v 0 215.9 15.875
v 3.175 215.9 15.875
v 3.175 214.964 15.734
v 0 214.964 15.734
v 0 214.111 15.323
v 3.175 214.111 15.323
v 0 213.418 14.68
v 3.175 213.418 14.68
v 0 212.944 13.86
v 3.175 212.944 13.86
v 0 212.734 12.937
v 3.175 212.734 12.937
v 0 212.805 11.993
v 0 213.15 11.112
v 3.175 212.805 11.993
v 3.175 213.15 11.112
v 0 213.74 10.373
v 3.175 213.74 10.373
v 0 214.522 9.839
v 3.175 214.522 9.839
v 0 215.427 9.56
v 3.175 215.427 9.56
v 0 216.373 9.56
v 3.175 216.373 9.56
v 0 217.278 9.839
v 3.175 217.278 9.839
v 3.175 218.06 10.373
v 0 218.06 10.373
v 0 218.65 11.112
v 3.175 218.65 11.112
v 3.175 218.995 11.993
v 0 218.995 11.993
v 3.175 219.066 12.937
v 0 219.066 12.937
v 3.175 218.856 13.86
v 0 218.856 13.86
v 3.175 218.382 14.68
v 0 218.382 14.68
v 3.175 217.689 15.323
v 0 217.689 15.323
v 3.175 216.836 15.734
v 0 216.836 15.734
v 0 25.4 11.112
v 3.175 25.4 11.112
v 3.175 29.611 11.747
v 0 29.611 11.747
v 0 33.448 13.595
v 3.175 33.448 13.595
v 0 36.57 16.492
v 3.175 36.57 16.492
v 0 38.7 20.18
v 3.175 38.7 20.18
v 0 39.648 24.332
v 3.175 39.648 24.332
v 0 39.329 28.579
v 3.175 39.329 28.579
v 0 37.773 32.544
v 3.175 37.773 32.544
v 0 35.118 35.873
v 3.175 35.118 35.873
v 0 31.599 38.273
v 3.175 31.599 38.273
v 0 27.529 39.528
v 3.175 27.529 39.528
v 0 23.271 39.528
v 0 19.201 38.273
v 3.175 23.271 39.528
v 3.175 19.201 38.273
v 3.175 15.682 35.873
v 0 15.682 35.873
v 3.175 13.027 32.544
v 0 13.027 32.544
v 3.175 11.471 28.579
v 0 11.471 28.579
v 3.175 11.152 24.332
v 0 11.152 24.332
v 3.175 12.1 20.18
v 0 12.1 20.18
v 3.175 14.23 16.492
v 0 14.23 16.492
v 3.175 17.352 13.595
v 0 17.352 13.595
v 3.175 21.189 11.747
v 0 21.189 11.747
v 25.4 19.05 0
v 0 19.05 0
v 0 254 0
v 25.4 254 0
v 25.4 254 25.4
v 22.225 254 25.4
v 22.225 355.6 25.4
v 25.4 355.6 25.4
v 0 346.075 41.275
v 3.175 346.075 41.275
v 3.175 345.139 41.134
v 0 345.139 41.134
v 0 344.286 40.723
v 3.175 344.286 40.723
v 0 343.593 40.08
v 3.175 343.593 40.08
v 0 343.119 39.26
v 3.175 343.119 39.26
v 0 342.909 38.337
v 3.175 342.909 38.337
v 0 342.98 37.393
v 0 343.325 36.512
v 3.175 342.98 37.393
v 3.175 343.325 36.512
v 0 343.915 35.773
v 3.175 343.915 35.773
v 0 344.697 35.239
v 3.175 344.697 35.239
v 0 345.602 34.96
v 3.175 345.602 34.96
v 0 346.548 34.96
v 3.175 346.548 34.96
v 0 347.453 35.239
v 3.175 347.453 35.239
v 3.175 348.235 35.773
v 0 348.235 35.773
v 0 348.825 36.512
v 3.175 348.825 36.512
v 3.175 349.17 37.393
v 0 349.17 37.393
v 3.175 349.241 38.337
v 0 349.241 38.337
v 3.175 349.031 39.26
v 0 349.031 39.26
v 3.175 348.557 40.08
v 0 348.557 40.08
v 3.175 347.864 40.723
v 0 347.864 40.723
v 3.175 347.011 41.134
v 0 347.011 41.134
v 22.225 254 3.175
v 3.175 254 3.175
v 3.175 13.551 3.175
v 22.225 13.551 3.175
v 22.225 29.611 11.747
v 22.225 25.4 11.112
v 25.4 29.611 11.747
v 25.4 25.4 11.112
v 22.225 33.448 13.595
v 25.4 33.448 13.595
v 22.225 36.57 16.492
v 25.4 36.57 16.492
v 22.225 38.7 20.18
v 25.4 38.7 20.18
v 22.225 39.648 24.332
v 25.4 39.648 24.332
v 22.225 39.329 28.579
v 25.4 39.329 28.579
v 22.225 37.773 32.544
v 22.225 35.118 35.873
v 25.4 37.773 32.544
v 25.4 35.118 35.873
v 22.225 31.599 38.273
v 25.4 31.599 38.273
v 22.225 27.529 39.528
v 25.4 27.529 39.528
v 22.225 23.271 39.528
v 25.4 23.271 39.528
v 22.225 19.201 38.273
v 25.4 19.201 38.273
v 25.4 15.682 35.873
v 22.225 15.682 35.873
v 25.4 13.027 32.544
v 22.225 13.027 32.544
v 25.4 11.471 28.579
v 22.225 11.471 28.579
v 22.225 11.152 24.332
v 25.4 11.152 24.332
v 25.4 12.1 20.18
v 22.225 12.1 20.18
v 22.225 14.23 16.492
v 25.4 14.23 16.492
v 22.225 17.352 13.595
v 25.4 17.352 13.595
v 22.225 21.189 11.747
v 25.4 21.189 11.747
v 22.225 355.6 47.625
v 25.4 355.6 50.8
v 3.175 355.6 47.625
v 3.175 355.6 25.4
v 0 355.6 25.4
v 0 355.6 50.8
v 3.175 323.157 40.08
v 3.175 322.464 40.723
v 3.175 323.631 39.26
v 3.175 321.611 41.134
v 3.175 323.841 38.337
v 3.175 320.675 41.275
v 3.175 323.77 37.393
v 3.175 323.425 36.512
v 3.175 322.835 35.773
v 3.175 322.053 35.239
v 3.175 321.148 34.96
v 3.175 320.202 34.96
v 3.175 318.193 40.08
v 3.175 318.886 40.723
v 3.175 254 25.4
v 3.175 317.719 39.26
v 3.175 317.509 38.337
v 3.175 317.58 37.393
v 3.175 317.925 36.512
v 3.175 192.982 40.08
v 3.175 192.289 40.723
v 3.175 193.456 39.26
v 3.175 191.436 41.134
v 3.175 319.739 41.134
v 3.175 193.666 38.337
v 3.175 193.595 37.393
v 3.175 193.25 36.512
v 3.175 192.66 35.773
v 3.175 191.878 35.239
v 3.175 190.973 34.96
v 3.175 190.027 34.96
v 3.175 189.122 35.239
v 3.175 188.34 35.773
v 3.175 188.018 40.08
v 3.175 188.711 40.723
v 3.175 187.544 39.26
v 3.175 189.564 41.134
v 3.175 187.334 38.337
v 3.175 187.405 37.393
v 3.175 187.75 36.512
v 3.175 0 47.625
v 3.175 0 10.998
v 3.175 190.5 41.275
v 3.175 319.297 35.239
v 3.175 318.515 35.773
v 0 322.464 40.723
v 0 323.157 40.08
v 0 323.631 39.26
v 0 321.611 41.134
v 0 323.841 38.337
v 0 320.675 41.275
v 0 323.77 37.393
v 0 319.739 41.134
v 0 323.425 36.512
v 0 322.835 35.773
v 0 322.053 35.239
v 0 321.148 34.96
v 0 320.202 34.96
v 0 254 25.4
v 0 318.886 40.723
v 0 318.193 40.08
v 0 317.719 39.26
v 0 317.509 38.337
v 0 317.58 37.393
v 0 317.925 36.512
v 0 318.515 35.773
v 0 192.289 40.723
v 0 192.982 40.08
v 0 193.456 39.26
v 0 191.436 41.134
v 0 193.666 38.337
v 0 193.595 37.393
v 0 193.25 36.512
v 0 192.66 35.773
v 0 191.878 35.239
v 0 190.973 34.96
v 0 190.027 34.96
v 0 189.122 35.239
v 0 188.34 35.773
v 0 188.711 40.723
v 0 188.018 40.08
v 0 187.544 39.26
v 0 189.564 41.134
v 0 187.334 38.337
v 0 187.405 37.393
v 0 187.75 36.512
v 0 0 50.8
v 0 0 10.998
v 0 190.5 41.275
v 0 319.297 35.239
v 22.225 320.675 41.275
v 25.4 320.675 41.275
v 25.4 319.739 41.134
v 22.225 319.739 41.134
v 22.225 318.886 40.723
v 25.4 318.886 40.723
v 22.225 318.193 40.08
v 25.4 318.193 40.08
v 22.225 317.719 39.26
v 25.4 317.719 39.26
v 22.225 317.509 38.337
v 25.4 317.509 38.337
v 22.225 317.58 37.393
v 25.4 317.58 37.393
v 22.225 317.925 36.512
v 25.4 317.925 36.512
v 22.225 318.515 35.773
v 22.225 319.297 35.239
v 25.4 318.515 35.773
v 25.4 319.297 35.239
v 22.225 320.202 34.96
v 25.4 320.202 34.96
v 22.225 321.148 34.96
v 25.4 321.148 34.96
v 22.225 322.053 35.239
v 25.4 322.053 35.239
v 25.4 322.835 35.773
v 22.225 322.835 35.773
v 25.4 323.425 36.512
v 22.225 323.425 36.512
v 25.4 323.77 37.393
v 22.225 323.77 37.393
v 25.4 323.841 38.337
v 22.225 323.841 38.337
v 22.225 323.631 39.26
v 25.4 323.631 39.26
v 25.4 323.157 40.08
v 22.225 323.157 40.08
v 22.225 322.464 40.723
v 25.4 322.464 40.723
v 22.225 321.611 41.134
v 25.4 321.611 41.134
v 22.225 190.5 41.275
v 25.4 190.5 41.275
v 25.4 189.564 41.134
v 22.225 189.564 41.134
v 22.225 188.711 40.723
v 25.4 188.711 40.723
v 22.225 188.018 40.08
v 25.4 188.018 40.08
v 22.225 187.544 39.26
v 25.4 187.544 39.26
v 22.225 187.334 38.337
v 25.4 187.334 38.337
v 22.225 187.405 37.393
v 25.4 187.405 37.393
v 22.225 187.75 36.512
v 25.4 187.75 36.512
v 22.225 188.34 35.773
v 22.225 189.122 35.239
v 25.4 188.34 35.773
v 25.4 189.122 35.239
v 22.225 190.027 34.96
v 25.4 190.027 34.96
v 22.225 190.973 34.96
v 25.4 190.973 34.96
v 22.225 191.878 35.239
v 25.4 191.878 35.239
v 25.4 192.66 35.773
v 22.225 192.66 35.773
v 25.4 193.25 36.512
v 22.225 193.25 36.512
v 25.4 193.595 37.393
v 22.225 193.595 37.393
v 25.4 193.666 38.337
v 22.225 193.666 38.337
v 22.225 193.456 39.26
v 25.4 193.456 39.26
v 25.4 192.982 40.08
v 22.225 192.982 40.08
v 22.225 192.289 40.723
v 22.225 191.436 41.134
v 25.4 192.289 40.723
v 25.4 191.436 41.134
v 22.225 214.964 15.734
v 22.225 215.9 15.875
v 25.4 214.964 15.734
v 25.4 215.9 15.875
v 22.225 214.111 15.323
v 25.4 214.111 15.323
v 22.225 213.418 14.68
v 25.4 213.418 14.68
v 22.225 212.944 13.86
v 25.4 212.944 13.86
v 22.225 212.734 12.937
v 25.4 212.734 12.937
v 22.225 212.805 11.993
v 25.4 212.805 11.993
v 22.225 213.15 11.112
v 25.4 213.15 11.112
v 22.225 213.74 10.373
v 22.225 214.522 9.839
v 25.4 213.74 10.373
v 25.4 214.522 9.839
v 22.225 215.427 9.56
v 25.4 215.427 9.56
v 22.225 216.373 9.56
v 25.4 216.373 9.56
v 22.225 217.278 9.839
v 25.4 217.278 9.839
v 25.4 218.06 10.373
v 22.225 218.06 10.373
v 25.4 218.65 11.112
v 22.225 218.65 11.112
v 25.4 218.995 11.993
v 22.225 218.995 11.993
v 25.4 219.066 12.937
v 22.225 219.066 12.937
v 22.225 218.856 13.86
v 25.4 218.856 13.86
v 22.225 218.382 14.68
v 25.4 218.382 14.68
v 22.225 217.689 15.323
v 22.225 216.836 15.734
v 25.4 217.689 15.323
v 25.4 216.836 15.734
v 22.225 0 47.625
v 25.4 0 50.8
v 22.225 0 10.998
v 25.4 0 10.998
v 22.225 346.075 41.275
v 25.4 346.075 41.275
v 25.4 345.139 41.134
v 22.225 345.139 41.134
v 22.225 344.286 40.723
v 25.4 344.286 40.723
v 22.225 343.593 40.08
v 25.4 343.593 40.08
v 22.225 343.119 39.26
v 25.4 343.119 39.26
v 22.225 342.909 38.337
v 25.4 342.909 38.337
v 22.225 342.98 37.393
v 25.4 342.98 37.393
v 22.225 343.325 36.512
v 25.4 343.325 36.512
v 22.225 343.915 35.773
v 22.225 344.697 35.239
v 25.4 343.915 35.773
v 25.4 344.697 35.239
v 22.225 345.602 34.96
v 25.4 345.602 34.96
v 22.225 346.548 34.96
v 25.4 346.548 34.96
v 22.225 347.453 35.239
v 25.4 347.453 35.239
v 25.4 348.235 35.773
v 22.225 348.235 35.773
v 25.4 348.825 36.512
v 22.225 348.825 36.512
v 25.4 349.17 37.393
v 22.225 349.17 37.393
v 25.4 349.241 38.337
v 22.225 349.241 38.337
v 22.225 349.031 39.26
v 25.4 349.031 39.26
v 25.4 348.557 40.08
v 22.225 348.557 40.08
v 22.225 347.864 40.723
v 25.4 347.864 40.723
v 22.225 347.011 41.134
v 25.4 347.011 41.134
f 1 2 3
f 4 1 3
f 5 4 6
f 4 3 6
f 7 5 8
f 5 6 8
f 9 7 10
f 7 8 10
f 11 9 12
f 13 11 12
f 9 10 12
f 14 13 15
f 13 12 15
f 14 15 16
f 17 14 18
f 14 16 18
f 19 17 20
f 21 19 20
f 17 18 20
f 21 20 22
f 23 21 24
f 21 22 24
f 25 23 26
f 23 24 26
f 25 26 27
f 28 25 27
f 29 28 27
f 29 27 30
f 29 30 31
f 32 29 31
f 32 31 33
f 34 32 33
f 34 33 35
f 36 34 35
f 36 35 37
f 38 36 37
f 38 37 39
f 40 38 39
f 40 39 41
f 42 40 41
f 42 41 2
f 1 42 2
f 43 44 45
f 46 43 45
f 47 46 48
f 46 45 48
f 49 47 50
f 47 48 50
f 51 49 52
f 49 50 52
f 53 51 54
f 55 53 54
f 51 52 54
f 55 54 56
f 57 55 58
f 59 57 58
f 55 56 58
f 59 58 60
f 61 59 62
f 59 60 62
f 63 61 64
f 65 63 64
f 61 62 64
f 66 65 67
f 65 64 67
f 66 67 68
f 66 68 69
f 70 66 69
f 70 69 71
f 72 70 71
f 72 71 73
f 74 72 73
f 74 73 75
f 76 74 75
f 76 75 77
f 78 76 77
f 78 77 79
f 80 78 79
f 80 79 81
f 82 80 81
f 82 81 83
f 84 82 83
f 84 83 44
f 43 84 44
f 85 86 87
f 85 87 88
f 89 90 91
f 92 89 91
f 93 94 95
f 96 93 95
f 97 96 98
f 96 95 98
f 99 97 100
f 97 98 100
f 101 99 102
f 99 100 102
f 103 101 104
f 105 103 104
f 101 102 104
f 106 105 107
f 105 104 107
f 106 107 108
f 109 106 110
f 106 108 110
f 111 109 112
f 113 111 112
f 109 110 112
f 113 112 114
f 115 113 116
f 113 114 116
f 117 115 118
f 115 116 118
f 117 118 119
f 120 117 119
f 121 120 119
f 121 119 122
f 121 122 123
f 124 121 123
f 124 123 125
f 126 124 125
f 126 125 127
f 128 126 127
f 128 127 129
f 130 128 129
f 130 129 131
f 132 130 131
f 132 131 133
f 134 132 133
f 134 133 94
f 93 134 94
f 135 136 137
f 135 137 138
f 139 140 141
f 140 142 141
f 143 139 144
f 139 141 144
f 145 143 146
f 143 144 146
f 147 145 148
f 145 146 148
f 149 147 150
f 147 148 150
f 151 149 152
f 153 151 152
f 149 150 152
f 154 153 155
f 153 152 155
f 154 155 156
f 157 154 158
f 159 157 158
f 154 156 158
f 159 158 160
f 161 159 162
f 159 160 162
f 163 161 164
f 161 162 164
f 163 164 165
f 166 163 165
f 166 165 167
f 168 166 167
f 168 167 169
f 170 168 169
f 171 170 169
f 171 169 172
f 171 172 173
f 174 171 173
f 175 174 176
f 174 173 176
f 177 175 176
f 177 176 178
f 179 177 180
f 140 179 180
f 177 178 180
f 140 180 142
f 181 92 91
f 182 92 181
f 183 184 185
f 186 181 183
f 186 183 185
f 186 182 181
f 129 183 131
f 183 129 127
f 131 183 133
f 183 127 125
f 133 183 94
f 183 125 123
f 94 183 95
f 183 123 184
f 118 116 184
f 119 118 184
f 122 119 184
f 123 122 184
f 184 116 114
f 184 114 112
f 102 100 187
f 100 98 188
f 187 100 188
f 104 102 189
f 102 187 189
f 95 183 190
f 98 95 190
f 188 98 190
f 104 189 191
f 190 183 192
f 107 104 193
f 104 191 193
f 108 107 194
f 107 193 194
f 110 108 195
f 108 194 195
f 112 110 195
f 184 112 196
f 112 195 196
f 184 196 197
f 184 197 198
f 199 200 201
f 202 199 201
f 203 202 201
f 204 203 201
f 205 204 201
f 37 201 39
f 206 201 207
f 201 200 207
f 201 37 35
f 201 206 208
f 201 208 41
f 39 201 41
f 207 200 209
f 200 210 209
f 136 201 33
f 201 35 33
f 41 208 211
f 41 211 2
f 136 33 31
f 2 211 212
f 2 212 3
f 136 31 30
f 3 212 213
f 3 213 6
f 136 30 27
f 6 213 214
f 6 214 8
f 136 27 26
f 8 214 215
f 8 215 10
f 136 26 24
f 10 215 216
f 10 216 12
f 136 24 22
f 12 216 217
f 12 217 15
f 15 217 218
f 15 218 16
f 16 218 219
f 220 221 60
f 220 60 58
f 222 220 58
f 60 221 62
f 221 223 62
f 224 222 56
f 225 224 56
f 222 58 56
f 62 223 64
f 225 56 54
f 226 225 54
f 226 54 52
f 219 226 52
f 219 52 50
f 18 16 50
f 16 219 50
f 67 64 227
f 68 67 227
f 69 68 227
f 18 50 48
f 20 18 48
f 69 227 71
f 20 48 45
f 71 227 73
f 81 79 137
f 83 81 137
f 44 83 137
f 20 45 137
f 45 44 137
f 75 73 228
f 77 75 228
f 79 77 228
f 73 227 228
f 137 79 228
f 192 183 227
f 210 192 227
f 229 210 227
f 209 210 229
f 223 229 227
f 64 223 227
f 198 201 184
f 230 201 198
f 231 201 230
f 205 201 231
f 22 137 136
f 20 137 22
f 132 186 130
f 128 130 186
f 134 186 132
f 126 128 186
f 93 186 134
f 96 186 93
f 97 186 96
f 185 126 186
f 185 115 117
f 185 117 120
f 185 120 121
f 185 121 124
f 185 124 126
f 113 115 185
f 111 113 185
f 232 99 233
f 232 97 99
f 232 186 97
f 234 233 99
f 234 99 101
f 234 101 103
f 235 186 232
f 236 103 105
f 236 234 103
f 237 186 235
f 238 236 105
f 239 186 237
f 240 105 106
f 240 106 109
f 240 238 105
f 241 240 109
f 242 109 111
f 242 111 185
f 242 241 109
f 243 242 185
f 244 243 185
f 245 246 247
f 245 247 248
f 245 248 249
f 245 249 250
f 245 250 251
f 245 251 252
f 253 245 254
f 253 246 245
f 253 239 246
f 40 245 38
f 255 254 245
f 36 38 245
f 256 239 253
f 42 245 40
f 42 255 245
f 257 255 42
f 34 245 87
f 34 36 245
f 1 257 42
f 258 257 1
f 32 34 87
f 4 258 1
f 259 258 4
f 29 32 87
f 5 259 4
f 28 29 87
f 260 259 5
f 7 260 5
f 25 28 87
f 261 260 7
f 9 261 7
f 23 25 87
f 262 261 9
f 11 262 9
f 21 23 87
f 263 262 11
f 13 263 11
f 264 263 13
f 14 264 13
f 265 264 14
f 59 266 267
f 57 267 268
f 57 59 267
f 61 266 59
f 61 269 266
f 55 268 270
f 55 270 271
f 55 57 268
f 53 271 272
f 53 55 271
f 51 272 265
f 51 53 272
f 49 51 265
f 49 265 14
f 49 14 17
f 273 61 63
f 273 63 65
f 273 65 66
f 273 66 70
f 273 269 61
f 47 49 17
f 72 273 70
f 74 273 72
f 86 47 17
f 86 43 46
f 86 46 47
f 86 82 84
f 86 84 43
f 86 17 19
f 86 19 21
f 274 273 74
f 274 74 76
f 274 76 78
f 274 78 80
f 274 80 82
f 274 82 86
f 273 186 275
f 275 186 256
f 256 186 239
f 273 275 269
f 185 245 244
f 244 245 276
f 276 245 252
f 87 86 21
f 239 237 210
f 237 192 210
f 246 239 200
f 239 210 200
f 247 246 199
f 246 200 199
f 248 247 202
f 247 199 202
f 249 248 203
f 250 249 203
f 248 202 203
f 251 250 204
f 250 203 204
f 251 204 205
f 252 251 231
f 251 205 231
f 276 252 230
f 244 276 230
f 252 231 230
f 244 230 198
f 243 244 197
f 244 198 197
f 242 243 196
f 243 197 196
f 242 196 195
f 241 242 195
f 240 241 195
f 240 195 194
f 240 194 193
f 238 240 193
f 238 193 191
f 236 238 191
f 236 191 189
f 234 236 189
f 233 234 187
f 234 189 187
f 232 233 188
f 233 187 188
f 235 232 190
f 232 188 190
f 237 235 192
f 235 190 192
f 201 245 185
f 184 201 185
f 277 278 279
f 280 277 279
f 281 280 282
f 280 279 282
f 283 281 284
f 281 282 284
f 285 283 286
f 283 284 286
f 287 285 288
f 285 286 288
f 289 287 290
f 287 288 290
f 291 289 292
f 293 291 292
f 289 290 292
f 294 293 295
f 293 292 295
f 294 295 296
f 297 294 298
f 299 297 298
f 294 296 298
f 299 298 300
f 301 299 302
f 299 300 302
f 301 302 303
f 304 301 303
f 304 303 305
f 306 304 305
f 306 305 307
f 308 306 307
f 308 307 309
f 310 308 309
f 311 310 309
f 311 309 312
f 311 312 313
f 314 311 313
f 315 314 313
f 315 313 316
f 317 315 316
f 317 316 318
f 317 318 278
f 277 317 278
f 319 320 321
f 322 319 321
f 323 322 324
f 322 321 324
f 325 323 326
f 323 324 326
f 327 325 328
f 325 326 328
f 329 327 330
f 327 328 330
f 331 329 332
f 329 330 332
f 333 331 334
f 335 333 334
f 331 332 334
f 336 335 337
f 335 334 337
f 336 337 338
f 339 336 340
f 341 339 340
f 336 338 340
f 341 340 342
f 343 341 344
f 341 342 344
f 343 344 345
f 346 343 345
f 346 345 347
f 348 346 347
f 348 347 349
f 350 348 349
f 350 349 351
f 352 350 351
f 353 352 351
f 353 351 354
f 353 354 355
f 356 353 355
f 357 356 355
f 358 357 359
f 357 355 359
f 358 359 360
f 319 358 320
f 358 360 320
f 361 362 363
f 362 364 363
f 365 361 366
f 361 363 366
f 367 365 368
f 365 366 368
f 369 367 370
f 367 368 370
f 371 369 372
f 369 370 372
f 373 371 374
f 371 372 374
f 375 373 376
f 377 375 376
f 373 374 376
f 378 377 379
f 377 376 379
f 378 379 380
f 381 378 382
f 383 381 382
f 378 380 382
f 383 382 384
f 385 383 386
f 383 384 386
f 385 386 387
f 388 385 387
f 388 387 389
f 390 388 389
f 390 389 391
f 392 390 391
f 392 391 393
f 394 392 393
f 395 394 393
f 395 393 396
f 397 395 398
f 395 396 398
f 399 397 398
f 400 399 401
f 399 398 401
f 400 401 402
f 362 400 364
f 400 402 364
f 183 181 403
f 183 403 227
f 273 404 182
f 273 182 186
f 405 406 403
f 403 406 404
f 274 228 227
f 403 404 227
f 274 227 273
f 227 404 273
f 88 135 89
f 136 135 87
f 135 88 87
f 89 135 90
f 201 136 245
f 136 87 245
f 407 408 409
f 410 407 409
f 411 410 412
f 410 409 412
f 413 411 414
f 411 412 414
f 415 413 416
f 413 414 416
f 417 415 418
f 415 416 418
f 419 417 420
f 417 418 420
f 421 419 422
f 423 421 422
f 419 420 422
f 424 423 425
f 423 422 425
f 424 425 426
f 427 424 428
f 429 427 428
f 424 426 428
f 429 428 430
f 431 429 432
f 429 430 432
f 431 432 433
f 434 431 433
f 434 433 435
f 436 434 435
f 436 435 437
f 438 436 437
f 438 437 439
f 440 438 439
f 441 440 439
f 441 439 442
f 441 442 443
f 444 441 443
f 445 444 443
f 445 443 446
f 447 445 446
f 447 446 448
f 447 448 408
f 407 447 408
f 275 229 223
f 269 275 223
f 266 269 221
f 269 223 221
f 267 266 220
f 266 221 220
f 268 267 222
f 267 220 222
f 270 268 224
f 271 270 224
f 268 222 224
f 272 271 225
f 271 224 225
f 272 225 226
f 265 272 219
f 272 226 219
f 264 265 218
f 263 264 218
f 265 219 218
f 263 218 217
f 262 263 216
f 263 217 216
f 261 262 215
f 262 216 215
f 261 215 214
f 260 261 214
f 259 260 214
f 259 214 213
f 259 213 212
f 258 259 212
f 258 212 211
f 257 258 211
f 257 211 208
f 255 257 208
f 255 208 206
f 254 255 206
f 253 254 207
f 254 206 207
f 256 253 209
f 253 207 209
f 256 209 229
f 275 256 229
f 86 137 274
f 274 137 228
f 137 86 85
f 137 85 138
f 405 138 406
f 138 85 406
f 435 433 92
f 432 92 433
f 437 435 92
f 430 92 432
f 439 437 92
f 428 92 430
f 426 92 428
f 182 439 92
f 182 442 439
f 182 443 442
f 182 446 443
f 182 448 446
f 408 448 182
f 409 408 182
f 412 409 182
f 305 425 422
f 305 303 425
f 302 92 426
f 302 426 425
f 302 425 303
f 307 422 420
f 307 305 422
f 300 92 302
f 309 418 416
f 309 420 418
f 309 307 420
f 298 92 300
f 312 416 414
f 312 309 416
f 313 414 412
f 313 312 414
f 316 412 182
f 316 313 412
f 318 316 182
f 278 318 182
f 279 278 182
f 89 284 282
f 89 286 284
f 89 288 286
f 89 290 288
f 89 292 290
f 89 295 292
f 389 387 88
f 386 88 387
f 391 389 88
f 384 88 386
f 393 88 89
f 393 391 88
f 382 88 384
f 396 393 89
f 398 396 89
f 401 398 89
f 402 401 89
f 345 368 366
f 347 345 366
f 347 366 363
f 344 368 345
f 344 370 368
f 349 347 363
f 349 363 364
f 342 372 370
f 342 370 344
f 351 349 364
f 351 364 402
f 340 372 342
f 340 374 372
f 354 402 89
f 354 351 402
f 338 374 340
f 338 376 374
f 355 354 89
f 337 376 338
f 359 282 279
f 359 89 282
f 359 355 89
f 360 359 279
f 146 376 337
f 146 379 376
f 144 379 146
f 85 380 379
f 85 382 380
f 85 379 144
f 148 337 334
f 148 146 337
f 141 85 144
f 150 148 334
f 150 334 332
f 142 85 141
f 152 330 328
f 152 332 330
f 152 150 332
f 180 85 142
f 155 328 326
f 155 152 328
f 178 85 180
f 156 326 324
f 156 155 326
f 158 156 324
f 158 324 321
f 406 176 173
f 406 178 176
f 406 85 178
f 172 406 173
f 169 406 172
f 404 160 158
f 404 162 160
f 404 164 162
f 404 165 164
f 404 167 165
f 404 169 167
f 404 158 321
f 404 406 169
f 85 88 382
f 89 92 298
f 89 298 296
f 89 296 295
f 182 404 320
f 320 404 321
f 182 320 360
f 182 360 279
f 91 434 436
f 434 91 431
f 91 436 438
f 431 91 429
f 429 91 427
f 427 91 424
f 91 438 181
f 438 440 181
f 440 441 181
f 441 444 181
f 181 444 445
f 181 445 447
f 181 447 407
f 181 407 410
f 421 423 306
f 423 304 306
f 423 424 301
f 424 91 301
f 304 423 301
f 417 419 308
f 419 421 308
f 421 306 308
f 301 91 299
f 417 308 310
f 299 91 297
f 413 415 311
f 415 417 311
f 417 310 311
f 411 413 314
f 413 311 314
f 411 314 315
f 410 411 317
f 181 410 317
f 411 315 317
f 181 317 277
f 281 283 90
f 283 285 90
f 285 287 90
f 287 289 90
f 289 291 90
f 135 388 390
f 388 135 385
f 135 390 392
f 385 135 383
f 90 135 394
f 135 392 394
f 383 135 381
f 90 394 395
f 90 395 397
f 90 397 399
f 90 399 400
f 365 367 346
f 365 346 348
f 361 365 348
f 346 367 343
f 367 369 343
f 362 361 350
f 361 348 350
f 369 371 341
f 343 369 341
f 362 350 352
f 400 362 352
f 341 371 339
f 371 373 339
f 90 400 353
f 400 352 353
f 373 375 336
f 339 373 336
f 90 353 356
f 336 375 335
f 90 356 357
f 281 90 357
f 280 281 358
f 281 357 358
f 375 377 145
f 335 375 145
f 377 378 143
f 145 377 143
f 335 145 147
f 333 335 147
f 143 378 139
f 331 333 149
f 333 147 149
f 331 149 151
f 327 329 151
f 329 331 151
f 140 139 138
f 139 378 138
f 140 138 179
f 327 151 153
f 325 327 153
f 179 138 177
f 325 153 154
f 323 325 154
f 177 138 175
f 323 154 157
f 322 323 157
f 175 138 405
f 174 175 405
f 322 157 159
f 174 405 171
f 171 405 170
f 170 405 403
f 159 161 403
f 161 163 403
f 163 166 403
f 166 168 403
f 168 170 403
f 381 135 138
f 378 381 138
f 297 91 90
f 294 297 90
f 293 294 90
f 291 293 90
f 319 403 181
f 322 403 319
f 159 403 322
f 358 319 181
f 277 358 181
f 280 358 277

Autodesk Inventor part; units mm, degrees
ref_plane "YZ Plane" through (0, 0, 0) normal (1, 0, 0) x (0, 1, 0)
ref_plane "XZ Plane" through (0, 0, 0) normal (0, 1, 0) x (-1, 0, 0)
ref_plane "XY Plane" through (0, 0, 0) normal (0, 0, 1) x (1, 0, 0)
sketch "Sketch1" plane through (0, 0, 0) normal (0, 1, 0) x (-1, 0, 0)
  line L0 (0, 0) -> (-25.4, 0)
  line L1 (-25.4, 0) -> (-25.4, 50.8)
  line L2 (-25.4, 50.8) -> (0, 50.8)
  line L3 (0, 50.8) -> (0, 0)
  line L4 (-3.175, 3.175) -> (-22.225, 3.175)
  line L5 (-22.225, 3.175) -> (-22.225, 47.625)
  line L6 (-22.225, 47.625) -> (-3.175, 47.625)
  line L7 (-3.175, 47.625) -> (-3.175, 3.175)
  dimension "d0" = 25.4
  dimension "d1" = 50.8
  dimension "d2" = 3.175
extrude "Extrusion1" add sketch "Sketch1" along normal blind 355.6
sketch "Sketch2" plane through (25.4, 0, 50.8) normal (1, 0, 0) x (0, 0, -1)
  circle A0 centre (25.4, 25.4) radius 14.2875
  line L0 (50.8, 0) -> (50.8, 355.6) projected
  line L1 (50.8, 0) -> (0, 0) projected
  dimension "d5" = 28.575
  dimension "d6" = 25.4
  dimension "d7" = 25.4
extrude "Extrusion2" cut sketch "Sketch2" against normal blind 25.4
sketch "Sketch3" plane through (0, 0, 0) normal (-1, 0, 0) x (0, 0, 1)
  line L0 (50.8, 0) -> (50.8, 355.6) projected
  line L1 (0, 355.6) -> (50.8, 355.6) projected
  line L2 (0, 0) -> (0, 355.6) projected
  line L3 (0, 0) -> (50.8, 0) projected
  point P0 (38.1, 346.075)
  point P1 (38.1, 190.5)
  point P2 (38.1, 320.675)
  point P3 (12.7, 215.9)
  dimension "d10" = 12.7
  dimension "d11" = 9.525
  dimension "d19" = 25.4
  dimension "d20" = 38.1
  dimension "d21" = 38.1
  dimension "d23" = 190.5
  dimension "d26" = 215.9
  dimension "d27" = 12.7
hole "Hole1" at (0, 346.075, 38.1) at (0, 320.675, 38.1) at (0, 190.5, 38.1) at (0, 215.9, 12.7) direction (1, 0, 0) diameter 6.35 end through all
sketch "Sketch4" plane through (0, 0, 0) normal (-1, 0, 0) x (0, 0, 1)
  line L0 (0, 0) -> (0, 355.6) projected
  line L1 (25.4, 355.6) -> (0, 355.6)
  line L2 (0, 355.6) -> (0, 254)
  line L3 (0, 254) -> (25.4, 254)
  line L4 (25.4, 254) -> (25.4, 355.6)
  line L5 (0, 355.6) -> (50.8, 355.6) projected
  line L6 (50.8, 0) -> (50.8, 355.6) projected
  line L7 (50.8, 0) -> (0, 0) projected
  dimension "d28" = 25.4
  dimension "d29" = 254
extrude "Extrusion3" cut sketch "Sketch4" against normal blind 25.4 contours L0 L1 L4 L3
sketch "Sketch6" plane through (25.4, 0, 50.8) normal (1, 0, 0) x (0, 0, -1)
  line L0 (50.8, 0) -> (50.8, 254) projected
  line L1 (50.8, 19.05) -> (39.8015, 0)
  line L2 (3.175, 0) -> (47.625, 0) projected
  line L3 (50.8, 0) -> (0, 0) projected
  line L4 (47.625, 0) -> (50.8, 0)
  dimension "d52" = 30
  dimension "d53" = 9.525
extrude "Extrusion5" cut sketch "Sketch6" against normal blind 25.4
equation "\"BendRadius\" = Thickness"
equation "\"BendReliefWidth\" = Thickness"
equation "\"BendReliefDepth\" = 0.5 * Thickness"
equation "\"CornerReliefSize\" = 4 * Thickness"
equation "\"MinimumRemnant\" = 2 * Thickness"
equation "\"TransitionRadius\" = BendRadius"
equation "\"JacobiRadiusSize\" = Thickness"
equation "\"GapSize\" = Thickness"
equation "\"Thickness\" = 3.048"
properties part number "15102898-16-A-0301" material "Aluminum 6061"
